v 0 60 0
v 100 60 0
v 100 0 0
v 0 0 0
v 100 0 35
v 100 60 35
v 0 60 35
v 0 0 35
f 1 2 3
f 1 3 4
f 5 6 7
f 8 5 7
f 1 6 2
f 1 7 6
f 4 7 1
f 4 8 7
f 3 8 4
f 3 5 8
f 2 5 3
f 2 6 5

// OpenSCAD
// enclosure: generated by ShapeBridge (https://github.com/gazi-faysal-jubayer/shapebridge)
// Units: mm. Edit the parameters below; geometry updates from them.

$fn = 64;

length = 100;
width = 60;
height = 35;
wall = 2.5;
radius = 6;

// NOTE: fillet "round" has no OpenSCAD equivalent and is not applied (radius 6 on vertical edges).
// NOTE: shell "hollow" has no OpenSCAD equivalent and is not applied (wall 2.5, open top).

multmatrix([[1, 0, 0, 0], [0, 1, 0, 0], [0, 0, 1, 0], [0, 0, 0, 1]]) translate([0, 0, min(0, height)]) linear_extrude(height = abs(height)) polygon([[0, 0], [length, 0], [length, width], [0, width]]); // body
